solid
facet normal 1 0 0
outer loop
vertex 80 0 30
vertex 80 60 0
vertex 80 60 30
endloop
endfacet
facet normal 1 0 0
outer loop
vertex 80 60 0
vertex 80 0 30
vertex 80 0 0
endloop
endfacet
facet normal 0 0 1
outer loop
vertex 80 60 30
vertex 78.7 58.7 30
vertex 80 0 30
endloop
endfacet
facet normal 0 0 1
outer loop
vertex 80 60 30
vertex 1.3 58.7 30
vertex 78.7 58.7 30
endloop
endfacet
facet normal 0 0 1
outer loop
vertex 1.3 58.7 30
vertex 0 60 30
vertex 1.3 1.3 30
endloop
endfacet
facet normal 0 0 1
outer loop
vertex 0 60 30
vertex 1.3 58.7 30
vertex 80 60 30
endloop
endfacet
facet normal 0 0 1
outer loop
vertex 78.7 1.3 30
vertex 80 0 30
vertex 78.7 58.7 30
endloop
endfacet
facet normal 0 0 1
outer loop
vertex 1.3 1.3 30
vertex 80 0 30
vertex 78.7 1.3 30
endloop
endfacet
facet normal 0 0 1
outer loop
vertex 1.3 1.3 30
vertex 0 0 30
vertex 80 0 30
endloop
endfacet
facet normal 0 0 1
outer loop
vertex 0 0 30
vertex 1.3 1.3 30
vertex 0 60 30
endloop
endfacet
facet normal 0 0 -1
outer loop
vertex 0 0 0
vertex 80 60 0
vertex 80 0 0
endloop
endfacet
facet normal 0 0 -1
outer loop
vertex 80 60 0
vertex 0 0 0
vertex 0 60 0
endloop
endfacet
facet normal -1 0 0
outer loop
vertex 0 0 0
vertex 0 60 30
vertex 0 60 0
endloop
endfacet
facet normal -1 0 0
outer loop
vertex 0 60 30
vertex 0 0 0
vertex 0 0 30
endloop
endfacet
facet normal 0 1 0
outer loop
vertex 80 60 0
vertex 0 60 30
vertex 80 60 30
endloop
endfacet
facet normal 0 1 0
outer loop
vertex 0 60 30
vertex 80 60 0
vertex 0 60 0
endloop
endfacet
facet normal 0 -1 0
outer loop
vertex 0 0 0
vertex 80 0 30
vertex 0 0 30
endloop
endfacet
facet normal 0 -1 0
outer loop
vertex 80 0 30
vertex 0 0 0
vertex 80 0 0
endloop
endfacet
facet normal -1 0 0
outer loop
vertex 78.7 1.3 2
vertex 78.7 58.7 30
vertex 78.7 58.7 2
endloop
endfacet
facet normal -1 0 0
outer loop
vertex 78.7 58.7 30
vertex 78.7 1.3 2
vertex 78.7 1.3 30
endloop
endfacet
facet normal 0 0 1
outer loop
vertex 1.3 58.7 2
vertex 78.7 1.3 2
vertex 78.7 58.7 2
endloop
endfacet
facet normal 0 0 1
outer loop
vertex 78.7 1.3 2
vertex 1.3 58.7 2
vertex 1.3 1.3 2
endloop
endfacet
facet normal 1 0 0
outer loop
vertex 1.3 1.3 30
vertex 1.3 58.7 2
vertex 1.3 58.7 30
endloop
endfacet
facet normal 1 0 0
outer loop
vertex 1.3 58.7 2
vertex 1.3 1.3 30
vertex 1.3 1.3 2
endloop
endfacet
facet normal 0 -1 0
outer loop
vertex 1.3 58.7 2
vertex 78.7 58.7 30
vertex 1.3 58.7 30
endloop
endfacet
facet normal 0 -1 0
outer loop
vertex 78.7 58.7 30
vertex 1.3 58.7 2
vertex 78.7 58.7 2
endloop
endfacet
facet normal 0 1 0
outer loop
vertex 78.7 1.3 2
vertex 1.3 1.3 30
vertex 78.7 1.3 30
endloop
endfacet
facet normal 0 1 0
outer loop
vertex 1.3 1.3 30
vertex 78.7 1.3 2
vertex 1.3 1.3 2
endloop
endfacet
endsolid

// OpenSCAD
$fn = 32;

// ----------------------------------------------------------------------
// Open box: 1.3 mm walls
// ----------------------------------------------------------------------

// --- parameters (mm) ---
box_l = 80;               // outer length, X
box_w = 60;               // outer width, Y
box_h = 30;               // outer height, Z
wall = 1.3;               // wall thickness
floor = 2;                // floor thickness
fit_tol = 0.05;           // tolerance for press fits, mm
free_tol = 0.3;           // tolerance for clearance fits, mm

difference() {
  cube([box_l, box_w, box_h]);
  translate([wall, wall, floor])
    cube([box_l - 2 * wall, box_w - 2 * wall, box_h]);
}
